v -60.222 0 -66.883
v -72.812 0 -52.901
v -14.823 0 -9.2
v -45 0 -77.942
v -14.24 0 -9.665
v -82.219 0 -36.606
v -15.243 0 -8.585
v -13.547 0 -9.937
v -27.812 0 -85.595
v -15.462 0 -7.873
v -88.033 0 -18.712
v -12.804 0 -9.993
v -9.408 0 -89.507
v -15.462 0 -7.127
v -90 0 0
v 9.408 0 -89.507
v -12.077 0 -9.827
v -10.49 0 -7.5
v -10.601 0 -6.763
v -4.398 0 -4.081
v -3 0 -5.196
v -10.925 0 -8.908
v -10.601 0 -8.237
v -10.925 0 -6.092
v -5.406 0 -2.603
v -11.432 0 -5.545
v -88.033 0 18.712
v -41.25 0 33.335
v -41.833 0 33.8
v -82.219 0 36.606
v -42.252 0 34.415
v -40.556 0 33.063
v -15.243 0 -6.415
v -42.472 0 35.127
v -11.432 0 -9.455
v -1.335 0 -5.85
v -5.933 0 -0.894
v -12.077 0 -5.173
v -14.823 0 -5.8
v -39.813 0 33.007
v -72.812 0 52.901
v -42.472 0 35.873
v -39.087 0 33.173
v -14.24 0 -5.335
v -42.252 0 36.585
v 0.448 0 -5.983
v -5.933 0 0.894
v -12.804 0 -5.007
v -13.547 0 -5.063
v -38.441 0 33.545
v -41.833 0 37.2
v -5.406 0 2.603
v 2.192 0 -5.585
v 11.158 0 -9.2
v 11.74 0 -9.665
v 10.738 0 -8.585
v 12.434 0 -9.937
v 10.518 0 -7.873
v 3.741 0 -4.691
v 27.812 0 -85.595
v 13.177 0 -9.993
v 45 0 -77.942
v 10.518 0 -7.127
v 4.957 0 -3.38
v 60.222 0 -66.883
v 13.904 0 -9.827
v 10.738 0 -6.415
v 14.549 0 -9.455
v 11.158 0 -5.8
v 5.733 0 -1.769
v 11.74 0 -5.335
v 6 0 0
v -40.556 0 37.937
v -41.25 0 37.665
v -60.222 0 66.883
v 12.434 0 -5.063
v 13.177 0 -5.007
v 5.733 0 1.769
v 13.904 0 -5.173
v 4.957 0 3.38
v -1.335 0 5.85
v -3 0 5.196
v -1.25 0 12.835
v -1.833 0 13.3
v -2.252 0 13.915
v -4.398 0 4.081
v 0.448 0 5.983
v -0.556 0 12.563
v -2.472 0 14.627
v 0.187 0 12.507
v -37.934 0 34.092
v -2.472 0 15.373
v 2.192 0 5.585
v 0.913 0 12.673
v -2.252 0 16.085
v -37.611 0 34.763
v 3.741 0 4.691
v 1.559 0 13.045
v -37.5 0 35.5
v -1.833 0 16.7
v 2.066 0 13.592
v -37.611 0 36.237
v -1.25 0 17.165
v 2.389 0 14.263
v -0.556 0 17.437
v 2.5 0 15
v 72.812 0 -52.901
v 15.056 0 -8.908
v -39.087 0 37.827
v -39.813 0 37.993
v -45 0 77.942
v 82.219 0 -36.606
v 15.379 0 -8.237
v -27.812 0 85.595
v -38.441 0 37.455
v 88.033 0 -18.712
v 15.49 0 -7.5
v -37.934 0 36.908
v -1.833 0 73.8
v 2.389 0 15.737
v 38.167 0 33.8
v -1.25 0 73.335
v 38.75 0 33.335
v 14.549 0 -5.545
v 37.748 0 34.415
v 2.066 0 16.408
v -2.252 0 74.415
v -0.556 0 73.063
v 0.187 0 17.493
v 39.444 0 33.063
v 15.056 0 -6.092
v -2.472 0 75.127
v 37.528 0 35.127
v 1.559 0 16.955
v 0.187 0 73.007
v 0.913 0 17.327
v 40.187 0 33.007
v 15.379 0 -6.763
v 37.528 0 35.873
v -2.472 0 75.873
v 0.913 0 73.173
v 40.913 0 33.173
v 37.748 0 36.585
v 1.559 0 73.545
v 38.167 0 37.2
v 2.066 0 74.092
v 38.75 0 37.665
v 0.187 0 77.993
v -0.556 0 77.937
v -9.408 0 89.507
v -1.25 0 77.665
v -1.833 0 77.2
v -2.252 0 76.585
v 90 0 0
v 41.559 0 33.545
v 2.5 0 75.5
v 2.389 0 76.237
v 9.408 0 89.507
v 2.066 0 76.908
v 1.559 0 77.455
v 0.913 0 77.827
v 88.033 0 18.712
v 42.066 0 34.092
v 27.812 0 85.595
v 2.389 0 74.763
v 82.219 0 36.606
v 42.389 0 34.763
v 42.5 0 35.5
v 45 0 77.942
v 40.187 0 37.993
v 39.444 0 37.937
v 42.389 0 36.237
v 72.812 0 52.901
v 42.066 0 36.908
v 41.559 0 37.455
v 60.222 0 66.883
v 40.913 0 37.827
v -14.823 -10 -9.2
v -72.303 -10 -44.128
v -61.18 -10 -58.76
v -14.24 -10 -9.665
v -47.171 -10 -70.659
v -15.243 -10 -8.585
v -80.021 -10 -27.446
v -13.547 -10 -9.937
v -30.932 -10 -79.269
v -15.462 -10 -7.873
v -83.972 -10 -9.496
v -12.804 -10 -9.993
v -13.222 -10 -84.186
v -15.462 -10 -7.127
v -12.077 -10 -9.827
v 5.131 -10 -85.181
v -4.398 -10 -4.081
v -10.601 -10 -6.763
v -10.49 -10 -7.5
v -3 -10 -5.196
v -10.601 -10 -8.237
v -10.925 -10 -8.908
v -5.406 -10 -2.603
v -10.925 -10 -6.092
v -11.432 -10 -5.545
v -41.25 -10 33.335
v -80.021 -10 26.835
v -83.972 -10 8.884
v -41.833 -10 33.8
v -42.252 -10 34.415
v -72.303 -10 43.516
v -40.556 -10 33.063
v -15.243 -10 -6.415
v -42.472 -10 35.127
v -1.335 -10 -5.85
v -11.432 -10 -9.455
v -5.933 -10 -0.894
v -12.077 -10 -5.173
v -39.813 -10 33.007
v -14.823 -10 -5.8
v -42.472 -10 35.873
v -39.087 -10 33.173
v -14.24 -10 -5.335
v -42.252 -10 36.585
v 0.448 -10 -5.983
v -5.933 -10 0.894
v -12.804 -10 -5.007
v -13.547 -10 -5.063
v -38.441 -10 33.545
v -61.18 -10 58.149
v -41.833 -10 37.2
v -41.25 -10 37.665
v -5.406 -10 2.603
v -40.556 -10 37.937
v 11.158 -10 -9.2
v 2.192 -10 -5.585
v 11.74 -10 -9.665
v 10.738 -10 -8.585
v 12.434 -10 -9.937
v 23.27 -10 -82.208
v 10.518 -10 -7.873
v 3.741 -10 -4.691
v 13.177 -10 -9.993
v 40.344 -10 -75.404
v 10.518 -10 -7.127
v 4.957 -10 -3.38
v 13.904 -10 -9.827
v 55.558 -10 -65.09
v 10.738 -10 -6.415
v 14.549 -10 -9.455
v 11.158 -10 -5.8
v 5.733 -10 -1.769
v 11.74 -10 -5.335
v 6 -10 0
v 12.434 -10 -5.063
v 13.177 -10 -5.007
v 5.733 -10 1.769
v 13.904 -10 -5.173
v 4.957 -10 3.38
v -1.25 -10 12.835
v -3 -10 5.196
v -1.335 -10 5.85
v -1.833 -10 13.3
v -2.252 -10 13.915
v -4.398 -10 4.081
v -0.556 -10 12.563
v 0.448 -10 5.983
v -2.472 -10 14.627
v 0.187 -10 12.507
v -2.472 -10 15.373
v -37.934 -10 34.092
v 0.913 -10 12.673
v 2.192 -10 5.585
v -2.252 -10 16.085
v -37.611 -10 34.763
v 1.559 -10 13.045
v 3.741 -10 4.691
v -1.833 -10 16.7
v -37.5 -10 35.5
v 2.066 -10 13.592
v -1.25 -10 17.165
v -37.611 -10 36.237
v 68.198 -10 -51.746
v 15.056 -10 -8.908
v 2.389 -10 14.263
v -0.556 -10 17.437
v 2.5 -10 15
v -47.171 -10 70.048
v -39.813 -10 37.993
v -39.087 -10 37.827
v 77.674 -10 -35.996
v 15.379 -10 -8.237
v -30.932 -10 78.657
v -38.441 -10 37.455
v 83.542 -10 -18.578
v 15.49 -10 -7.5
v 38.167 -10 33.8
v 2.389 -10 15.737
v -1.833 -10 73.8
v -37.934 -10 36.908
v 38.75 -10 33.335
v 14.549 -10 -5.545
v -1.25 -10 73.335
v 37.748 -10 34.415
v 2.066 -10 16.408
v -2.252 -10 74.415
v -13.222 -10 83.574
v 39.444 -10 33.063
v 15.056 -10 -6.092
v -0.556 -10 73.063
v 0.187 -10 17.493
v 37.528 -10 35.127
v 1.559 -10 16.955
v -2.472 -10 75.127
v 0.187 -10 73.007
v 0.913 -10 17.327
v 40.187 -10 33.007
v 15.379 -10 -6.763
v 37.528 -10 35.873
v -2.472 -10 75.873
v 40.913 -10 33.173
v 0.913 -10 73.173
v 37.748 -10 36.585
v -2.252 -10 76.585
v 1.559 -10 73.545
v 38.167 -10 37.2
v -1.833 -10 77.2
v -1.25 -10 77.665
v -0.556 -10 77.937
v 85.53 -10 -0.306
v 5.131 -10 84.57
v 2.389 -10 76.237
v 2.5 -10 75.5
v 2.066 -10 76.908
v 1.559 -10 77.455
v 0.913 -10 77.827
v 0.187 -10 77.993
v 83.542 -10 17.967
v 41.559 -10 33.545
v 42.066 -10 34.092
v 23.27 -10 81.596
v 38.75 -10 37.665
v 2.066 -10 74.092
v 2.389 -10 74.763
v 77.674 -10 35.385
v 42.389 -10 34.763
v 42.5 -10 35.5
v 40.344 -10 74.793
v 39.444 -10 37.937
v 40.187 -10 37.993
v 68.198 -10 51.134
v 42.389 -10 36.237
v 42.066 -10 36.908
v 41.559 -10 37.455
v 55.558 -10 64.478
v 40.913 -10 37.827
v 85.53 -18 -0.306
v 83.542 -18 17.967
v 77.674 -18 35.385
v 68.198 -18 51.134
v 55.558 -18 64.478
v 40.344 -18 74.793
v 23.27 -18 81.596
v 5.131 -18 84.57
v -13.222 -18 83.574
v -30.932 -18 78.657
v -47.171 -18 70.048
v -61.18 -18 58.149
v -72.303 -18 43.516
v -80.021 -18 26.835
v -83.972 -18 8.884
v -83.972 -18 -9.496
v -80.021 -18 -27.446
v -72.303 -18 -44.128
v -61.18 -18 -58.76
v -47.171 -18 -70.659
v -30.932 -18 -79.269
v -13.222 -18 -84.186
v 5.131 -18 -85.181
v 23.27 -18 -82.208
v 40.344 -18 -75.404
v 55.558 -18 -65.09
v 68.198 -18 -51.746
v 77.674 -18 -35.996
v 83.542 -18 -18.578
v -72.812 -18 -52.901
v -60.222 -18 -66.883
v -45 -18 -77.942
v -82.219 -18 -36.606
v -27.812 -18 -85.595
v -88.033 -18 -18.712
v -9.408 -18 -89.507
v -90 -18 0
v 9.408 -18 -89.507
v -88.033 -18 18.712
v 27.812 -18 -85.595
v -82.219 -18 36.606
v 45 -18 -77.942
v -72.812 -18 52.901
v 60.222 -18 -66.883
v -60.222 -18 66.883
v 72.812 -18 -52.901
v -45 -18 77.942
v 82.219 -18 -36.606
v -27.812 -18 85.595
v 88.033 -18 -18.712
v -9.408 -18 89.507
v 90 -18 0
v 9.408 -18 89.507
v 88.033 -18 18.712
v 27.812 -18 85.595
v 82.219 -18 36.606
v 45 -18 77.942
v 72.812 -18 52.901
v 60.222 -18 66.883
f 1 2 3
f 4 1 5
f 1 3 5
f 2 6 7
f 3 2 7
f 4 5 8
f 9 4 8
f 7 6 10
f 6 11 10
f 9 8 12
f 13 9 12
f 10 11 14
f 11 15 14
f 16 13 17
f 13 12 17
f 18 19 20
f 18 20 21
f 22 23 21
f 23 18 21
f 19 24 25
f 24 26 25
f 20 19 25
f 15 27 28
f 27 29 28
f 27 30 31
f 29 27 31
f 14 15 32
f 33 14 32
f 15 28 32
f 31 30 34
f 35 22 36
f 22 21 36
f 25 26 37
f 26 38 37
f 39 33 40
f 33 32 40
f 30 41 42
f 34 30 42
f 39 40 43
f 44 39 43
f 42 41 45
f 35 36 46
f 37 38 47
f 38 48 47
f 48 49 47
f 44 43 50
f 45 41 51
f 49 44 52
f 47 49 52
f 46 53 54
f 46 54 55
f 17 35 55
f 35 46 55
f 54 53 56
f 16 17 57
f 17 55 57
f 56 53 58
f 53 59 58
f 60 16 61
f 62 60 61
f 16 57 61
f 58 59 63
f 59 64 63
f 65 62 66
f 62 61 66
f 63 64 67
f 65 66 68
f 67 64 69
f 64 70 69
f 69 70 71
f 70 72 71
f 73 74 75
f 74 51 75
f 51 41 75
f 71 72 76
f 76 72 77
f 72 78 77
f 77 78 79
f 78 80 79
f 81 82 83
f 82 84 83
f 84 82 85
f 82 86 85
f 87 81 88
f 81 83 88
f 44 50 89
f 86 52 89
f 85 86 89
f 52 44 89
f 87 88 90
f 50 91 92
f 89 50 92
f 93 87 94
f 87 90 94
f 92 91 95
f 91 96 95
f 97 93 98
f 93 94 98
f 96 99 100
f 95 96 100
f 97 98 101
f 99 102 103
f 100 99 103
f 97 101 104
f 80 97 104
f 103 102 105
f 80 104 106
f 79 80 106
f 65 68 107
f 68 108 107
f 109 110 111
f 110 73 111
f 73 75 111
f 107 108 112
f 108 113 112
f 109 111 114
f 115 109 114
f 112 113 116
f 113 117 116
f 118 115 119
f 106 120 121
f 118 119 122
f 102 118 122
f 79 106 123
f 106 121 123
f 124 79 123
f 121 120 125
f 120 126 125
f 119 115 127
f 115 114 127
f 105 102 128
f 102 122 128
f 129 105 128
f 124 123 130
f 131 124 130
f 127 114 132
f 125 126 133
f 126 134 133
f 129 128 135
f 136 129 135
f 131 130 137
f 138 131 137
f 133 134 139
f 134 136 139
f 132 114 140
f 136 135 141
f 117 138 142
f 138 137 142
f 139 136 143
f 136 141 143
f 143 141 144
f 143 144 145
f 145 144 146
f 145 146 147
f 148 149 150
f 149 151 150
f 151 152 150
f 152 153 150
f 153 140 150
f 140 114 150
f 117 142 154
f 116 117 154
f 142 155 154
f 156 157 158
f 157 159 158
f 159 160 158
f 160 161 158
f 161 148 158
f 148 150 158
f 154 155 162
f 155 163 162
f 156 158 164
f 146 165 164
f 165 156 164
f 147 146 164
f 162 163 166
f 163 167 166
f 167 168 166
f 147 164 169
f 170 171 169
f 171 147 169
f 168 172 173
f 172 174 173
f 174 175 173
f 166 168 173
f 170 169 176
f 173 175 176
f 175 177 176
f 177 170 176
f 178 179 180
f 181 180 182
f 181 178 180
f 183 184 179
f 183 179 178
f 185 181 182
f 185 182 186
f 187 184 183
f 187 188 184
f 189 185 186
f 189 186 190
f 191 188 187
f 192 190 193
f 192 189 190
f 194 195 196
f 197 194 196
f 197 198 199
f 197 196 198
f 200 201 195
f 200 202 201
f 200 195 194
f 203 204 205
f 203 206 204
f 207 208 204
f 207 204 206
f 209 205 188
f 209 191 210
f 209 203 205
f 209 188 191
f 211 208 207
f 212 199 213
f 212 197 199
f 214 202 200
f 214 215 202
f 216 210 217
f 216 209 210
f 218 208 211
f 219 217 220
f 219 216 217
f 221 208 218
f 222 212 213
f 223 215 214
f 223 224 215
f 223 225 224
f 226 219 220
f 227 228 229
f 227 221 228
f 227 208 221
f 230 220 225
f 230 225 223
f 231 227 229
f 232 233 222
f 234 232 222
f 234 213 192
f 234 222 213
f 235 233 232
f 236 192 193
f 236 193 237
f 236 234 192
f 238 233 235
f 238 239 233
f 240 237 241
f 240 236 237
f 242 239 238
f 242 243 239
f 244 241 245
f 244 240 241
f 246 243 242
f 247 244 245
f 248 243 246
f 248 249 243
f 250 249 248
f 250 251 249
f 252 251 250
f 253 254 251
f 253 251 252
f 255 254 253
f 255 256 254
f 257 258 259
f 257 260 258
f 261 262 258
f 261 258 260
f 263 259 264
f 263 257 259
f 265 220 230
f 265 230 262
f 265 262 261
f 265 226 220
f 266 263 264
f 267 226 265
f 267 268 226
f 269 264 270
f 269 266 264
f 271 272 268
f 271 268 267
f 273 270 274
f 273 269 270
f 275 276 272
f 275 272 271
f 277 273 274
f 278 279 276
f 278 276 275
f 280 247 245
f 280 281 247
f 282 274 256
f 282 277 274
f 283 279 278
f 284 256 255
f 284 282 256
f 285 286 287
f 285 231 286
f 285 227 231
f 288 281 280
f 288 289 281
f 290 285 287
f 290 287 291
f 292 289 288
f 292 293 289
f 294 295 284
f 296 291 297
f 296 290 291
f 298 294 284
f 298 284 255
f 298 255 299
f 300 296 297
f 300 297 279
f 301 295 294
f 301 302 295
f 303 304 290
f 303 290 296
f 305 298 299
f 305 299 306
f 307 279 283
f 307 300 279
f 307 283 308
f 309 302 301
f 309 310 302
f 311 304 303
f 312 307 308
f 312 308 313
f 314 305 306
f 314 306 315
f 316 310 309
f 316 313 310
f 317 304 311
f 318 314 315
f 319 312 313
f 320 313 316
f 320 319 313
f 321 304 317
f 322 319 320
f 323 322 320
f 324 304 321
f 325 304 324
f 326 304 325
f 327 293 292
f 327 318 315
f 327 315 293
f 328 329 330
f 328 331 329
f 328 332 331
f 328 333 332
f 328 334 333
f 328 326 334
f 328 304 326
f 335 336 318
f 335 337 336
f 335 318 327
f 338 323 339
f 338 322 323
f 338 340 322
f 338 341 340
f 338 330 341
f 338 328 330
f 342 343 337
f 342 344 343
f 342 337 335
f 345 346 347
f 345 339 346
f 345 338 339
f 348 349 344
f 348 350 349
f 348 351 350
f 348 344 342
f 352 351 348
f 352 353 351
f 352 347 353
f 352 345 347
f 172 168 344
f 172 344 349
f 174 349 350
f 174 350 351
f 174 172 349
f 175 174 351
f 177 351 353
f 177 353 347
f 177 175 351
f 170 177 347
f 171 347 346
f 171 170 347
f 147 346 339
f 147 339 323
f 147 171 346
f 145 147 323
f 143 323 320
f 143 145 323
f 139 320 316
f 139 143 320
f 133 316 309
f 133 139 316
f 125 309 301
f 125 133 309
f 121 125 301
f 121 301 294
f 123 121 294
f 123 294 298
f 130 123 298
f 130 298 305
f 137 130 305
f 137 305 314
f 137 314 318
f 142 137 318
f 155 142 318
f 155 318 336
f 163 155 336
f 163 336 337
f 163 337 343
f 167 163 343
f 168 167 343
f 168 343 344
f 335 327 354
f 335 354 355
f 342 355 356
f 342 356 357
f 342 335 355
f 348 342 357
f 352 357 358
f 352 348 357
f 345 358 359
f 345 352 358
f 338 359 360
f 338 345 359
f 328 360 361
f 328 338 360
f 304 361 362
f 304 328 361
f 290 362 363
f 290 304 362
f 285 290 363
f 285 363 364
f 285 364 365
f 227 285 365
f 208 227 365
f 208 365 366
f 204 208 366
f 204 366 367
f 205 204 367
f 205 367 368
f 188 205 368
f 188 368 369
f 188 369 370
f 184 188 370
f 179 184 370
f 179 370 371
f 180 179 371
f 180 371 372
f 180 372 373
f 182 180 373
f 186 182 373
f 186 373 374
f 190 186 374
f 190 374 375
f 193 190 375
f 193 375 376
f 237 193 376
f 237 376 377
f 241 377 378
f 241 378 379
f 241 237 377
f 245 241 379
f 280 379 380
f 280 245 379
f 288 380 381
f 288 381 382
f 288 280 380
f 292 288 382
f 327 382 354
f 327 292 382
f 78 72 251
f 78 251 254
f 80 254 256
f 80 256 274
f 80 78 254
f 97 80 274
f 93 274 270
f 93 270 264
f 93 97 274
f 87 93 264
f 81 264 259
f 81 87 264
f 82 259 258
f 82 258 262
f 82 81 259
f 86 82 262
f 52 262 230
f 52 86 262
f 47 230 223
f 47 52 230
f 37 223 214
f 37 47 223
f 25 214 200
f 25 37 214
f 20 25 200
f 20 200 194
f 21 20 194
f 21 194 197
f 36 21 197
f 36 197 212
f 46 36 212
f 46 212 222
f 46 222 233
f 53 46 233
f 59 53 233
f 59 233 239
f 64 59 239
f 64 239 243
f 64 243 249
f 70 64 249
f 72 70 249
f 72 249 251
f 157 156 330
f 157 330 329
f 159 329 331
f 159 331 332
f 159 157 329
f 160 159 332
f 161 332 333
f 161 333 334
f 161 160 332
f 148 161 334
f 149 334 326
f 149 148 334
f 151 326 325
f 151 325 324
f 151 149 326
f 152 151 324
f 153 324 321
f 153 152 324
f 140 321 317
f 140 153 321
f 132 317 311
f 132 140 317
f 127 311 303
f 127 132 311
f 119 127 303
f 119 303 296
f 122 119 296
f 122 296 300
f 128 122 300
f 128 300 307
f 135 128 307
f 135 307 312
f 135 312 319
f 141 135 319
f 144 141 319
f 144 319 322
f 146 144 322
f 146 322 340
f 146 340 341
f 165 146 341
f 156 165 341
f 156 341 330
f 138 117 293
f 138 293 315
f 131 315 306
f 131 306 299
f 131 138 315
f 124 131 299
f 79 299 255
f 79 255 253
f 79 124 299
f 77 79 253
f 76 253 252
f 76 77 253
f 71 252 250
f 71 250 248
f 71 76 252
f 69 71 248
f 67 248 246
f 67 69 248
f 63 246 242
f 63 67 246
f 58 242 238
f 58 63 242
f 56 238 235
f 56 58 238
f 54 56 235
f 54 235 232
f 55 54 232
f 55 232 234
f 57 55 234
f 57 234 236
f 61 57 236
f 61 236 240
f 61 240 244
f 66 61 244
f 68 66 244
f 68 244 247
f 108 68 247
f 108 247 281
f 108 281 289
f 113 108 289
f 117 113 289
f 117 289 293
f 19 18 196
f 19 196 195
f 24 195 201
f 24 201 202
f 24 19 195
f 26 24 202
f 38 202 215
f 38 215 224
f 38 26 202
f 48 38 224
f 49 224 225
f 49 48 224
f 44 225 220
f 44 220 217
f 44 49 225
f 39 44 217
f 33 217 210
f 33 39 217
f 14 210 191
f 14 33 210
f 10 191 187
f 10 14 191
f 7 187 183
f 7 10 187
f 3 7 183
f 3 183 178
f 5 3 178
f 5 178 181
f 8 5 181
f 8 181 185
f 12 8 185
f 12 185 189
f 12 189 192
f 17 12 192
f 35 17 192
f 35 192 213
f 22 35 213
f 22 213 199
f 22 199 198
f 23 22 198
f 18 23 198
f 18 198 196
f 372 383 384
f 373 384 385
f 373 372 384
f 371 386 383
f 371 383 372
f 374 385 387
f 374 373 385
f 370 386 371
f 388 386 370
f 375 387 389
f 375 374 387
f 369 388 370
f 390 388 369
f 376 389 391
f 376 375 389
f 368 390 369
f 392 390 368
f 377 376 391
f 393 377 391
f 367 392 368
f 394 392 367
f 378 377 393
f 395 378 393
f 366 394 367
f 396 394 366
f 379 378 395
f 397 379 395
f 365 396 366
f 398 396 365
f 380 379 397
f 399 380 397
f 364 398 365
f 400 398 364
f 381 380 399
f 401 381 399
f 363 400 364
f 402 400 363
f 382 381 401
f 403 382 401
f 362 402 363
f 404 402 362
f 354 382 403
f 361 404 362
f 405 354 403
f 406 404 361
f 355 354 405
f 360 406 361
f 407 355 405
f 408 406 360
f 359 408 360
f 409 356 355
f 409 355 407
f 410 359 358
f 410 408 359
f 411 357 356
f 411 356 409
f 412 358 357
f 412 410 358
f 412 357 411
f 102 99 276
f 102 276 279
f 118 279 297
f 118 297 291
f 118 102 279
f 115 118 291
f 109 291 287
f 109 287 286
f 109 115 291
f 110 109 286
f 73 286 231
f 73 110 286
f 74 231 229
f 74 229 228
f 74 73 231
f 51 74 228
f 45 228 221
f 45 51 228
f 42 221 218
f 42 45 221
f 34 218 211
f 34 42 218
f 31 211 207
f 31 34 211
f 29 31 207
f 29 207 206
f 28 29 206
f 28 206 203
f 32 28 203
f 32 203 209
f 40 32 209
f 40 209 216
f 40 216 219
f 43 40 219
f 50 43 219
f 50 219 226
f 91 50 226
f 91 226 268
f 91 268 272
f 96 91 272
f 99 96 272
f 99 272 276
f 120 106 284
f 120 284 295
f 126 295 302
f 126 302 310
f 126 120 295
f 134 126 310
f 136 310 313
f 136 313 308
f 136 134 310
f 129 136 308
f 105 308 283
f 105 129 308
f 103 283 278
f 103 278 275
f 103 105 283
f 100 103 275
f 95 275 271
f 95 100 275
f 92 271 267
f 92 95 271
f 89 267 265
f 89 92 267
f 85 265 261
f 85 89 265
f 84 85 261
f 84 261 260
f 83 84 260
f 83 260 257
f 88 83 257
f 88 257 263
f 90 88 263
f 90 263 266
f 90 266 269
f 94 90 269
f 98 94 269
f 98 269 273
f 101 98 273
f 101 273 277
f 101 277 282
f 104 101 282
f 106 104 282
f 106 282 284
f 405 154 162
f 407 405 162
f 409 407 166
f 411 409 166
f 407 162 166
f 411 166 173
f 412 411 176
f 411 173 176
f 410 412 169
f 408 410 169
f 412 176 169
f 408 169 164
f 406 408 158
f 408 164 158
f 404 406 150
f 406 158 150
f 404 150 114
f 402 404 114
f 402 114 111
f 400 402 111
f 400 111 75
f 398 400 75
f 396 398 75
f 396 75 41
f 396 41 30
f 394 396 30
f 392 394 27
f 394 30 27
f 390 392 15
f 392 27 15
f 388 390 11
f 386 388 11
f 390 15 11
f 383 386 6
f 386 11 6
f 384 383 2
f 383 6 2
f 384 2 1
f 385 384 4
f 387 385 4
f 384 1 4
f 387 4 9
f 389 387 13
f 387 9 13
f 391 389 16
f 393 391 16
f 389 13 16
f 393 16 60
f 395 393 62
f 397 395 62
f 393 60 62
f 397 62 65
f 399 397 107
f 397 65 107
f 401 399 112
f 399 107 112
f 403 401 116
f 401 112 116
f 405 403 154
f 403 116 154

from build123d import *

# Parameters (mm, degrees)
F0_R     = 85
F0_R_2   = 2.5
F0_R_3   = 6
F1_DEPTH = 5
F0_R_4   = 90
F2_DEPTH = 18
F3_DEPTH = 10


with BuildPart() as f1:
    # F0 (on Front) → F1 (new body)
    with BuildSketch(Plane.XZ):
        with Locations((0.529671, -0.305805)):
            Circle(F0_R)
        with Locations((-12.990381, -7.5)):
            Circle(F0_R_2, mode=Mode.SUBTRACT)
        with Locations((12.990381, -7.5)):
            Circle(F0_R_2, mode=Mode.SUBTRACT)
        with Locations((-40, 35.5)):
            Circle(F0_R_2, mode=Mode.SUBTRACT)
        Circle(F0_R_3, mode=Mode.SUBTRACT)
        with Locations((0, 15)):
            Circle(F0_R_2, mode=Mode.SUBTRACT)
        with Locations((40, 35.5)):
            Circle(F0_R_2, mode=Mode.SUBTRACT)
        with Locations((0, 75.5)):
            Circle(F0_R_2, mode=Mode.SUBTRACT)
    extrude(amount=F1_DEPTH)

    # F0 (on Front) → F2 (join)
    with BuildSketch(Plane.XZ):
        Circle(F0_R_4)
        with Locations((0.529671, -0.305805)):
            Circle(F0_R, mode=Mode.SUBTRACT)
    extrude(amount=F2_DEPTH)

    # F0 (on Front) → F3 (join)
    with BuildSketch(Plane.XZ):
        with Locations((0.529671, -0.305805)):
            Circle(F0_R)
        with Locations((-12.990381, -7.5)):
            Circle(F0_R_2, mode=Mode.SUBTRACT)
        with Locations((12.990381, -7.5)):
            Circle(F0_R_2, mode=Mode.SUBTRACT)
        with Locations((-40, 35.5)):
            Circle(F0_R_2, mode=Mode.SUBTRACT)
        Circle(F0_R_3, mode=Mode.SUBTRACT)
        with Locations((0, 15)):
            Circle(F0_R_2, mode=Mode.SUBTRACT)
        with Locations((40, 35.5)):
            Circle(F0_R_2, mode=Mode.SUBTRACT)
        with Locations((0, 75.5)):
            Circle(F0_R_2, mode=Mode.SUBTRACT)
    extrude(amount=F3_DEPTH)


solid = f1.part
